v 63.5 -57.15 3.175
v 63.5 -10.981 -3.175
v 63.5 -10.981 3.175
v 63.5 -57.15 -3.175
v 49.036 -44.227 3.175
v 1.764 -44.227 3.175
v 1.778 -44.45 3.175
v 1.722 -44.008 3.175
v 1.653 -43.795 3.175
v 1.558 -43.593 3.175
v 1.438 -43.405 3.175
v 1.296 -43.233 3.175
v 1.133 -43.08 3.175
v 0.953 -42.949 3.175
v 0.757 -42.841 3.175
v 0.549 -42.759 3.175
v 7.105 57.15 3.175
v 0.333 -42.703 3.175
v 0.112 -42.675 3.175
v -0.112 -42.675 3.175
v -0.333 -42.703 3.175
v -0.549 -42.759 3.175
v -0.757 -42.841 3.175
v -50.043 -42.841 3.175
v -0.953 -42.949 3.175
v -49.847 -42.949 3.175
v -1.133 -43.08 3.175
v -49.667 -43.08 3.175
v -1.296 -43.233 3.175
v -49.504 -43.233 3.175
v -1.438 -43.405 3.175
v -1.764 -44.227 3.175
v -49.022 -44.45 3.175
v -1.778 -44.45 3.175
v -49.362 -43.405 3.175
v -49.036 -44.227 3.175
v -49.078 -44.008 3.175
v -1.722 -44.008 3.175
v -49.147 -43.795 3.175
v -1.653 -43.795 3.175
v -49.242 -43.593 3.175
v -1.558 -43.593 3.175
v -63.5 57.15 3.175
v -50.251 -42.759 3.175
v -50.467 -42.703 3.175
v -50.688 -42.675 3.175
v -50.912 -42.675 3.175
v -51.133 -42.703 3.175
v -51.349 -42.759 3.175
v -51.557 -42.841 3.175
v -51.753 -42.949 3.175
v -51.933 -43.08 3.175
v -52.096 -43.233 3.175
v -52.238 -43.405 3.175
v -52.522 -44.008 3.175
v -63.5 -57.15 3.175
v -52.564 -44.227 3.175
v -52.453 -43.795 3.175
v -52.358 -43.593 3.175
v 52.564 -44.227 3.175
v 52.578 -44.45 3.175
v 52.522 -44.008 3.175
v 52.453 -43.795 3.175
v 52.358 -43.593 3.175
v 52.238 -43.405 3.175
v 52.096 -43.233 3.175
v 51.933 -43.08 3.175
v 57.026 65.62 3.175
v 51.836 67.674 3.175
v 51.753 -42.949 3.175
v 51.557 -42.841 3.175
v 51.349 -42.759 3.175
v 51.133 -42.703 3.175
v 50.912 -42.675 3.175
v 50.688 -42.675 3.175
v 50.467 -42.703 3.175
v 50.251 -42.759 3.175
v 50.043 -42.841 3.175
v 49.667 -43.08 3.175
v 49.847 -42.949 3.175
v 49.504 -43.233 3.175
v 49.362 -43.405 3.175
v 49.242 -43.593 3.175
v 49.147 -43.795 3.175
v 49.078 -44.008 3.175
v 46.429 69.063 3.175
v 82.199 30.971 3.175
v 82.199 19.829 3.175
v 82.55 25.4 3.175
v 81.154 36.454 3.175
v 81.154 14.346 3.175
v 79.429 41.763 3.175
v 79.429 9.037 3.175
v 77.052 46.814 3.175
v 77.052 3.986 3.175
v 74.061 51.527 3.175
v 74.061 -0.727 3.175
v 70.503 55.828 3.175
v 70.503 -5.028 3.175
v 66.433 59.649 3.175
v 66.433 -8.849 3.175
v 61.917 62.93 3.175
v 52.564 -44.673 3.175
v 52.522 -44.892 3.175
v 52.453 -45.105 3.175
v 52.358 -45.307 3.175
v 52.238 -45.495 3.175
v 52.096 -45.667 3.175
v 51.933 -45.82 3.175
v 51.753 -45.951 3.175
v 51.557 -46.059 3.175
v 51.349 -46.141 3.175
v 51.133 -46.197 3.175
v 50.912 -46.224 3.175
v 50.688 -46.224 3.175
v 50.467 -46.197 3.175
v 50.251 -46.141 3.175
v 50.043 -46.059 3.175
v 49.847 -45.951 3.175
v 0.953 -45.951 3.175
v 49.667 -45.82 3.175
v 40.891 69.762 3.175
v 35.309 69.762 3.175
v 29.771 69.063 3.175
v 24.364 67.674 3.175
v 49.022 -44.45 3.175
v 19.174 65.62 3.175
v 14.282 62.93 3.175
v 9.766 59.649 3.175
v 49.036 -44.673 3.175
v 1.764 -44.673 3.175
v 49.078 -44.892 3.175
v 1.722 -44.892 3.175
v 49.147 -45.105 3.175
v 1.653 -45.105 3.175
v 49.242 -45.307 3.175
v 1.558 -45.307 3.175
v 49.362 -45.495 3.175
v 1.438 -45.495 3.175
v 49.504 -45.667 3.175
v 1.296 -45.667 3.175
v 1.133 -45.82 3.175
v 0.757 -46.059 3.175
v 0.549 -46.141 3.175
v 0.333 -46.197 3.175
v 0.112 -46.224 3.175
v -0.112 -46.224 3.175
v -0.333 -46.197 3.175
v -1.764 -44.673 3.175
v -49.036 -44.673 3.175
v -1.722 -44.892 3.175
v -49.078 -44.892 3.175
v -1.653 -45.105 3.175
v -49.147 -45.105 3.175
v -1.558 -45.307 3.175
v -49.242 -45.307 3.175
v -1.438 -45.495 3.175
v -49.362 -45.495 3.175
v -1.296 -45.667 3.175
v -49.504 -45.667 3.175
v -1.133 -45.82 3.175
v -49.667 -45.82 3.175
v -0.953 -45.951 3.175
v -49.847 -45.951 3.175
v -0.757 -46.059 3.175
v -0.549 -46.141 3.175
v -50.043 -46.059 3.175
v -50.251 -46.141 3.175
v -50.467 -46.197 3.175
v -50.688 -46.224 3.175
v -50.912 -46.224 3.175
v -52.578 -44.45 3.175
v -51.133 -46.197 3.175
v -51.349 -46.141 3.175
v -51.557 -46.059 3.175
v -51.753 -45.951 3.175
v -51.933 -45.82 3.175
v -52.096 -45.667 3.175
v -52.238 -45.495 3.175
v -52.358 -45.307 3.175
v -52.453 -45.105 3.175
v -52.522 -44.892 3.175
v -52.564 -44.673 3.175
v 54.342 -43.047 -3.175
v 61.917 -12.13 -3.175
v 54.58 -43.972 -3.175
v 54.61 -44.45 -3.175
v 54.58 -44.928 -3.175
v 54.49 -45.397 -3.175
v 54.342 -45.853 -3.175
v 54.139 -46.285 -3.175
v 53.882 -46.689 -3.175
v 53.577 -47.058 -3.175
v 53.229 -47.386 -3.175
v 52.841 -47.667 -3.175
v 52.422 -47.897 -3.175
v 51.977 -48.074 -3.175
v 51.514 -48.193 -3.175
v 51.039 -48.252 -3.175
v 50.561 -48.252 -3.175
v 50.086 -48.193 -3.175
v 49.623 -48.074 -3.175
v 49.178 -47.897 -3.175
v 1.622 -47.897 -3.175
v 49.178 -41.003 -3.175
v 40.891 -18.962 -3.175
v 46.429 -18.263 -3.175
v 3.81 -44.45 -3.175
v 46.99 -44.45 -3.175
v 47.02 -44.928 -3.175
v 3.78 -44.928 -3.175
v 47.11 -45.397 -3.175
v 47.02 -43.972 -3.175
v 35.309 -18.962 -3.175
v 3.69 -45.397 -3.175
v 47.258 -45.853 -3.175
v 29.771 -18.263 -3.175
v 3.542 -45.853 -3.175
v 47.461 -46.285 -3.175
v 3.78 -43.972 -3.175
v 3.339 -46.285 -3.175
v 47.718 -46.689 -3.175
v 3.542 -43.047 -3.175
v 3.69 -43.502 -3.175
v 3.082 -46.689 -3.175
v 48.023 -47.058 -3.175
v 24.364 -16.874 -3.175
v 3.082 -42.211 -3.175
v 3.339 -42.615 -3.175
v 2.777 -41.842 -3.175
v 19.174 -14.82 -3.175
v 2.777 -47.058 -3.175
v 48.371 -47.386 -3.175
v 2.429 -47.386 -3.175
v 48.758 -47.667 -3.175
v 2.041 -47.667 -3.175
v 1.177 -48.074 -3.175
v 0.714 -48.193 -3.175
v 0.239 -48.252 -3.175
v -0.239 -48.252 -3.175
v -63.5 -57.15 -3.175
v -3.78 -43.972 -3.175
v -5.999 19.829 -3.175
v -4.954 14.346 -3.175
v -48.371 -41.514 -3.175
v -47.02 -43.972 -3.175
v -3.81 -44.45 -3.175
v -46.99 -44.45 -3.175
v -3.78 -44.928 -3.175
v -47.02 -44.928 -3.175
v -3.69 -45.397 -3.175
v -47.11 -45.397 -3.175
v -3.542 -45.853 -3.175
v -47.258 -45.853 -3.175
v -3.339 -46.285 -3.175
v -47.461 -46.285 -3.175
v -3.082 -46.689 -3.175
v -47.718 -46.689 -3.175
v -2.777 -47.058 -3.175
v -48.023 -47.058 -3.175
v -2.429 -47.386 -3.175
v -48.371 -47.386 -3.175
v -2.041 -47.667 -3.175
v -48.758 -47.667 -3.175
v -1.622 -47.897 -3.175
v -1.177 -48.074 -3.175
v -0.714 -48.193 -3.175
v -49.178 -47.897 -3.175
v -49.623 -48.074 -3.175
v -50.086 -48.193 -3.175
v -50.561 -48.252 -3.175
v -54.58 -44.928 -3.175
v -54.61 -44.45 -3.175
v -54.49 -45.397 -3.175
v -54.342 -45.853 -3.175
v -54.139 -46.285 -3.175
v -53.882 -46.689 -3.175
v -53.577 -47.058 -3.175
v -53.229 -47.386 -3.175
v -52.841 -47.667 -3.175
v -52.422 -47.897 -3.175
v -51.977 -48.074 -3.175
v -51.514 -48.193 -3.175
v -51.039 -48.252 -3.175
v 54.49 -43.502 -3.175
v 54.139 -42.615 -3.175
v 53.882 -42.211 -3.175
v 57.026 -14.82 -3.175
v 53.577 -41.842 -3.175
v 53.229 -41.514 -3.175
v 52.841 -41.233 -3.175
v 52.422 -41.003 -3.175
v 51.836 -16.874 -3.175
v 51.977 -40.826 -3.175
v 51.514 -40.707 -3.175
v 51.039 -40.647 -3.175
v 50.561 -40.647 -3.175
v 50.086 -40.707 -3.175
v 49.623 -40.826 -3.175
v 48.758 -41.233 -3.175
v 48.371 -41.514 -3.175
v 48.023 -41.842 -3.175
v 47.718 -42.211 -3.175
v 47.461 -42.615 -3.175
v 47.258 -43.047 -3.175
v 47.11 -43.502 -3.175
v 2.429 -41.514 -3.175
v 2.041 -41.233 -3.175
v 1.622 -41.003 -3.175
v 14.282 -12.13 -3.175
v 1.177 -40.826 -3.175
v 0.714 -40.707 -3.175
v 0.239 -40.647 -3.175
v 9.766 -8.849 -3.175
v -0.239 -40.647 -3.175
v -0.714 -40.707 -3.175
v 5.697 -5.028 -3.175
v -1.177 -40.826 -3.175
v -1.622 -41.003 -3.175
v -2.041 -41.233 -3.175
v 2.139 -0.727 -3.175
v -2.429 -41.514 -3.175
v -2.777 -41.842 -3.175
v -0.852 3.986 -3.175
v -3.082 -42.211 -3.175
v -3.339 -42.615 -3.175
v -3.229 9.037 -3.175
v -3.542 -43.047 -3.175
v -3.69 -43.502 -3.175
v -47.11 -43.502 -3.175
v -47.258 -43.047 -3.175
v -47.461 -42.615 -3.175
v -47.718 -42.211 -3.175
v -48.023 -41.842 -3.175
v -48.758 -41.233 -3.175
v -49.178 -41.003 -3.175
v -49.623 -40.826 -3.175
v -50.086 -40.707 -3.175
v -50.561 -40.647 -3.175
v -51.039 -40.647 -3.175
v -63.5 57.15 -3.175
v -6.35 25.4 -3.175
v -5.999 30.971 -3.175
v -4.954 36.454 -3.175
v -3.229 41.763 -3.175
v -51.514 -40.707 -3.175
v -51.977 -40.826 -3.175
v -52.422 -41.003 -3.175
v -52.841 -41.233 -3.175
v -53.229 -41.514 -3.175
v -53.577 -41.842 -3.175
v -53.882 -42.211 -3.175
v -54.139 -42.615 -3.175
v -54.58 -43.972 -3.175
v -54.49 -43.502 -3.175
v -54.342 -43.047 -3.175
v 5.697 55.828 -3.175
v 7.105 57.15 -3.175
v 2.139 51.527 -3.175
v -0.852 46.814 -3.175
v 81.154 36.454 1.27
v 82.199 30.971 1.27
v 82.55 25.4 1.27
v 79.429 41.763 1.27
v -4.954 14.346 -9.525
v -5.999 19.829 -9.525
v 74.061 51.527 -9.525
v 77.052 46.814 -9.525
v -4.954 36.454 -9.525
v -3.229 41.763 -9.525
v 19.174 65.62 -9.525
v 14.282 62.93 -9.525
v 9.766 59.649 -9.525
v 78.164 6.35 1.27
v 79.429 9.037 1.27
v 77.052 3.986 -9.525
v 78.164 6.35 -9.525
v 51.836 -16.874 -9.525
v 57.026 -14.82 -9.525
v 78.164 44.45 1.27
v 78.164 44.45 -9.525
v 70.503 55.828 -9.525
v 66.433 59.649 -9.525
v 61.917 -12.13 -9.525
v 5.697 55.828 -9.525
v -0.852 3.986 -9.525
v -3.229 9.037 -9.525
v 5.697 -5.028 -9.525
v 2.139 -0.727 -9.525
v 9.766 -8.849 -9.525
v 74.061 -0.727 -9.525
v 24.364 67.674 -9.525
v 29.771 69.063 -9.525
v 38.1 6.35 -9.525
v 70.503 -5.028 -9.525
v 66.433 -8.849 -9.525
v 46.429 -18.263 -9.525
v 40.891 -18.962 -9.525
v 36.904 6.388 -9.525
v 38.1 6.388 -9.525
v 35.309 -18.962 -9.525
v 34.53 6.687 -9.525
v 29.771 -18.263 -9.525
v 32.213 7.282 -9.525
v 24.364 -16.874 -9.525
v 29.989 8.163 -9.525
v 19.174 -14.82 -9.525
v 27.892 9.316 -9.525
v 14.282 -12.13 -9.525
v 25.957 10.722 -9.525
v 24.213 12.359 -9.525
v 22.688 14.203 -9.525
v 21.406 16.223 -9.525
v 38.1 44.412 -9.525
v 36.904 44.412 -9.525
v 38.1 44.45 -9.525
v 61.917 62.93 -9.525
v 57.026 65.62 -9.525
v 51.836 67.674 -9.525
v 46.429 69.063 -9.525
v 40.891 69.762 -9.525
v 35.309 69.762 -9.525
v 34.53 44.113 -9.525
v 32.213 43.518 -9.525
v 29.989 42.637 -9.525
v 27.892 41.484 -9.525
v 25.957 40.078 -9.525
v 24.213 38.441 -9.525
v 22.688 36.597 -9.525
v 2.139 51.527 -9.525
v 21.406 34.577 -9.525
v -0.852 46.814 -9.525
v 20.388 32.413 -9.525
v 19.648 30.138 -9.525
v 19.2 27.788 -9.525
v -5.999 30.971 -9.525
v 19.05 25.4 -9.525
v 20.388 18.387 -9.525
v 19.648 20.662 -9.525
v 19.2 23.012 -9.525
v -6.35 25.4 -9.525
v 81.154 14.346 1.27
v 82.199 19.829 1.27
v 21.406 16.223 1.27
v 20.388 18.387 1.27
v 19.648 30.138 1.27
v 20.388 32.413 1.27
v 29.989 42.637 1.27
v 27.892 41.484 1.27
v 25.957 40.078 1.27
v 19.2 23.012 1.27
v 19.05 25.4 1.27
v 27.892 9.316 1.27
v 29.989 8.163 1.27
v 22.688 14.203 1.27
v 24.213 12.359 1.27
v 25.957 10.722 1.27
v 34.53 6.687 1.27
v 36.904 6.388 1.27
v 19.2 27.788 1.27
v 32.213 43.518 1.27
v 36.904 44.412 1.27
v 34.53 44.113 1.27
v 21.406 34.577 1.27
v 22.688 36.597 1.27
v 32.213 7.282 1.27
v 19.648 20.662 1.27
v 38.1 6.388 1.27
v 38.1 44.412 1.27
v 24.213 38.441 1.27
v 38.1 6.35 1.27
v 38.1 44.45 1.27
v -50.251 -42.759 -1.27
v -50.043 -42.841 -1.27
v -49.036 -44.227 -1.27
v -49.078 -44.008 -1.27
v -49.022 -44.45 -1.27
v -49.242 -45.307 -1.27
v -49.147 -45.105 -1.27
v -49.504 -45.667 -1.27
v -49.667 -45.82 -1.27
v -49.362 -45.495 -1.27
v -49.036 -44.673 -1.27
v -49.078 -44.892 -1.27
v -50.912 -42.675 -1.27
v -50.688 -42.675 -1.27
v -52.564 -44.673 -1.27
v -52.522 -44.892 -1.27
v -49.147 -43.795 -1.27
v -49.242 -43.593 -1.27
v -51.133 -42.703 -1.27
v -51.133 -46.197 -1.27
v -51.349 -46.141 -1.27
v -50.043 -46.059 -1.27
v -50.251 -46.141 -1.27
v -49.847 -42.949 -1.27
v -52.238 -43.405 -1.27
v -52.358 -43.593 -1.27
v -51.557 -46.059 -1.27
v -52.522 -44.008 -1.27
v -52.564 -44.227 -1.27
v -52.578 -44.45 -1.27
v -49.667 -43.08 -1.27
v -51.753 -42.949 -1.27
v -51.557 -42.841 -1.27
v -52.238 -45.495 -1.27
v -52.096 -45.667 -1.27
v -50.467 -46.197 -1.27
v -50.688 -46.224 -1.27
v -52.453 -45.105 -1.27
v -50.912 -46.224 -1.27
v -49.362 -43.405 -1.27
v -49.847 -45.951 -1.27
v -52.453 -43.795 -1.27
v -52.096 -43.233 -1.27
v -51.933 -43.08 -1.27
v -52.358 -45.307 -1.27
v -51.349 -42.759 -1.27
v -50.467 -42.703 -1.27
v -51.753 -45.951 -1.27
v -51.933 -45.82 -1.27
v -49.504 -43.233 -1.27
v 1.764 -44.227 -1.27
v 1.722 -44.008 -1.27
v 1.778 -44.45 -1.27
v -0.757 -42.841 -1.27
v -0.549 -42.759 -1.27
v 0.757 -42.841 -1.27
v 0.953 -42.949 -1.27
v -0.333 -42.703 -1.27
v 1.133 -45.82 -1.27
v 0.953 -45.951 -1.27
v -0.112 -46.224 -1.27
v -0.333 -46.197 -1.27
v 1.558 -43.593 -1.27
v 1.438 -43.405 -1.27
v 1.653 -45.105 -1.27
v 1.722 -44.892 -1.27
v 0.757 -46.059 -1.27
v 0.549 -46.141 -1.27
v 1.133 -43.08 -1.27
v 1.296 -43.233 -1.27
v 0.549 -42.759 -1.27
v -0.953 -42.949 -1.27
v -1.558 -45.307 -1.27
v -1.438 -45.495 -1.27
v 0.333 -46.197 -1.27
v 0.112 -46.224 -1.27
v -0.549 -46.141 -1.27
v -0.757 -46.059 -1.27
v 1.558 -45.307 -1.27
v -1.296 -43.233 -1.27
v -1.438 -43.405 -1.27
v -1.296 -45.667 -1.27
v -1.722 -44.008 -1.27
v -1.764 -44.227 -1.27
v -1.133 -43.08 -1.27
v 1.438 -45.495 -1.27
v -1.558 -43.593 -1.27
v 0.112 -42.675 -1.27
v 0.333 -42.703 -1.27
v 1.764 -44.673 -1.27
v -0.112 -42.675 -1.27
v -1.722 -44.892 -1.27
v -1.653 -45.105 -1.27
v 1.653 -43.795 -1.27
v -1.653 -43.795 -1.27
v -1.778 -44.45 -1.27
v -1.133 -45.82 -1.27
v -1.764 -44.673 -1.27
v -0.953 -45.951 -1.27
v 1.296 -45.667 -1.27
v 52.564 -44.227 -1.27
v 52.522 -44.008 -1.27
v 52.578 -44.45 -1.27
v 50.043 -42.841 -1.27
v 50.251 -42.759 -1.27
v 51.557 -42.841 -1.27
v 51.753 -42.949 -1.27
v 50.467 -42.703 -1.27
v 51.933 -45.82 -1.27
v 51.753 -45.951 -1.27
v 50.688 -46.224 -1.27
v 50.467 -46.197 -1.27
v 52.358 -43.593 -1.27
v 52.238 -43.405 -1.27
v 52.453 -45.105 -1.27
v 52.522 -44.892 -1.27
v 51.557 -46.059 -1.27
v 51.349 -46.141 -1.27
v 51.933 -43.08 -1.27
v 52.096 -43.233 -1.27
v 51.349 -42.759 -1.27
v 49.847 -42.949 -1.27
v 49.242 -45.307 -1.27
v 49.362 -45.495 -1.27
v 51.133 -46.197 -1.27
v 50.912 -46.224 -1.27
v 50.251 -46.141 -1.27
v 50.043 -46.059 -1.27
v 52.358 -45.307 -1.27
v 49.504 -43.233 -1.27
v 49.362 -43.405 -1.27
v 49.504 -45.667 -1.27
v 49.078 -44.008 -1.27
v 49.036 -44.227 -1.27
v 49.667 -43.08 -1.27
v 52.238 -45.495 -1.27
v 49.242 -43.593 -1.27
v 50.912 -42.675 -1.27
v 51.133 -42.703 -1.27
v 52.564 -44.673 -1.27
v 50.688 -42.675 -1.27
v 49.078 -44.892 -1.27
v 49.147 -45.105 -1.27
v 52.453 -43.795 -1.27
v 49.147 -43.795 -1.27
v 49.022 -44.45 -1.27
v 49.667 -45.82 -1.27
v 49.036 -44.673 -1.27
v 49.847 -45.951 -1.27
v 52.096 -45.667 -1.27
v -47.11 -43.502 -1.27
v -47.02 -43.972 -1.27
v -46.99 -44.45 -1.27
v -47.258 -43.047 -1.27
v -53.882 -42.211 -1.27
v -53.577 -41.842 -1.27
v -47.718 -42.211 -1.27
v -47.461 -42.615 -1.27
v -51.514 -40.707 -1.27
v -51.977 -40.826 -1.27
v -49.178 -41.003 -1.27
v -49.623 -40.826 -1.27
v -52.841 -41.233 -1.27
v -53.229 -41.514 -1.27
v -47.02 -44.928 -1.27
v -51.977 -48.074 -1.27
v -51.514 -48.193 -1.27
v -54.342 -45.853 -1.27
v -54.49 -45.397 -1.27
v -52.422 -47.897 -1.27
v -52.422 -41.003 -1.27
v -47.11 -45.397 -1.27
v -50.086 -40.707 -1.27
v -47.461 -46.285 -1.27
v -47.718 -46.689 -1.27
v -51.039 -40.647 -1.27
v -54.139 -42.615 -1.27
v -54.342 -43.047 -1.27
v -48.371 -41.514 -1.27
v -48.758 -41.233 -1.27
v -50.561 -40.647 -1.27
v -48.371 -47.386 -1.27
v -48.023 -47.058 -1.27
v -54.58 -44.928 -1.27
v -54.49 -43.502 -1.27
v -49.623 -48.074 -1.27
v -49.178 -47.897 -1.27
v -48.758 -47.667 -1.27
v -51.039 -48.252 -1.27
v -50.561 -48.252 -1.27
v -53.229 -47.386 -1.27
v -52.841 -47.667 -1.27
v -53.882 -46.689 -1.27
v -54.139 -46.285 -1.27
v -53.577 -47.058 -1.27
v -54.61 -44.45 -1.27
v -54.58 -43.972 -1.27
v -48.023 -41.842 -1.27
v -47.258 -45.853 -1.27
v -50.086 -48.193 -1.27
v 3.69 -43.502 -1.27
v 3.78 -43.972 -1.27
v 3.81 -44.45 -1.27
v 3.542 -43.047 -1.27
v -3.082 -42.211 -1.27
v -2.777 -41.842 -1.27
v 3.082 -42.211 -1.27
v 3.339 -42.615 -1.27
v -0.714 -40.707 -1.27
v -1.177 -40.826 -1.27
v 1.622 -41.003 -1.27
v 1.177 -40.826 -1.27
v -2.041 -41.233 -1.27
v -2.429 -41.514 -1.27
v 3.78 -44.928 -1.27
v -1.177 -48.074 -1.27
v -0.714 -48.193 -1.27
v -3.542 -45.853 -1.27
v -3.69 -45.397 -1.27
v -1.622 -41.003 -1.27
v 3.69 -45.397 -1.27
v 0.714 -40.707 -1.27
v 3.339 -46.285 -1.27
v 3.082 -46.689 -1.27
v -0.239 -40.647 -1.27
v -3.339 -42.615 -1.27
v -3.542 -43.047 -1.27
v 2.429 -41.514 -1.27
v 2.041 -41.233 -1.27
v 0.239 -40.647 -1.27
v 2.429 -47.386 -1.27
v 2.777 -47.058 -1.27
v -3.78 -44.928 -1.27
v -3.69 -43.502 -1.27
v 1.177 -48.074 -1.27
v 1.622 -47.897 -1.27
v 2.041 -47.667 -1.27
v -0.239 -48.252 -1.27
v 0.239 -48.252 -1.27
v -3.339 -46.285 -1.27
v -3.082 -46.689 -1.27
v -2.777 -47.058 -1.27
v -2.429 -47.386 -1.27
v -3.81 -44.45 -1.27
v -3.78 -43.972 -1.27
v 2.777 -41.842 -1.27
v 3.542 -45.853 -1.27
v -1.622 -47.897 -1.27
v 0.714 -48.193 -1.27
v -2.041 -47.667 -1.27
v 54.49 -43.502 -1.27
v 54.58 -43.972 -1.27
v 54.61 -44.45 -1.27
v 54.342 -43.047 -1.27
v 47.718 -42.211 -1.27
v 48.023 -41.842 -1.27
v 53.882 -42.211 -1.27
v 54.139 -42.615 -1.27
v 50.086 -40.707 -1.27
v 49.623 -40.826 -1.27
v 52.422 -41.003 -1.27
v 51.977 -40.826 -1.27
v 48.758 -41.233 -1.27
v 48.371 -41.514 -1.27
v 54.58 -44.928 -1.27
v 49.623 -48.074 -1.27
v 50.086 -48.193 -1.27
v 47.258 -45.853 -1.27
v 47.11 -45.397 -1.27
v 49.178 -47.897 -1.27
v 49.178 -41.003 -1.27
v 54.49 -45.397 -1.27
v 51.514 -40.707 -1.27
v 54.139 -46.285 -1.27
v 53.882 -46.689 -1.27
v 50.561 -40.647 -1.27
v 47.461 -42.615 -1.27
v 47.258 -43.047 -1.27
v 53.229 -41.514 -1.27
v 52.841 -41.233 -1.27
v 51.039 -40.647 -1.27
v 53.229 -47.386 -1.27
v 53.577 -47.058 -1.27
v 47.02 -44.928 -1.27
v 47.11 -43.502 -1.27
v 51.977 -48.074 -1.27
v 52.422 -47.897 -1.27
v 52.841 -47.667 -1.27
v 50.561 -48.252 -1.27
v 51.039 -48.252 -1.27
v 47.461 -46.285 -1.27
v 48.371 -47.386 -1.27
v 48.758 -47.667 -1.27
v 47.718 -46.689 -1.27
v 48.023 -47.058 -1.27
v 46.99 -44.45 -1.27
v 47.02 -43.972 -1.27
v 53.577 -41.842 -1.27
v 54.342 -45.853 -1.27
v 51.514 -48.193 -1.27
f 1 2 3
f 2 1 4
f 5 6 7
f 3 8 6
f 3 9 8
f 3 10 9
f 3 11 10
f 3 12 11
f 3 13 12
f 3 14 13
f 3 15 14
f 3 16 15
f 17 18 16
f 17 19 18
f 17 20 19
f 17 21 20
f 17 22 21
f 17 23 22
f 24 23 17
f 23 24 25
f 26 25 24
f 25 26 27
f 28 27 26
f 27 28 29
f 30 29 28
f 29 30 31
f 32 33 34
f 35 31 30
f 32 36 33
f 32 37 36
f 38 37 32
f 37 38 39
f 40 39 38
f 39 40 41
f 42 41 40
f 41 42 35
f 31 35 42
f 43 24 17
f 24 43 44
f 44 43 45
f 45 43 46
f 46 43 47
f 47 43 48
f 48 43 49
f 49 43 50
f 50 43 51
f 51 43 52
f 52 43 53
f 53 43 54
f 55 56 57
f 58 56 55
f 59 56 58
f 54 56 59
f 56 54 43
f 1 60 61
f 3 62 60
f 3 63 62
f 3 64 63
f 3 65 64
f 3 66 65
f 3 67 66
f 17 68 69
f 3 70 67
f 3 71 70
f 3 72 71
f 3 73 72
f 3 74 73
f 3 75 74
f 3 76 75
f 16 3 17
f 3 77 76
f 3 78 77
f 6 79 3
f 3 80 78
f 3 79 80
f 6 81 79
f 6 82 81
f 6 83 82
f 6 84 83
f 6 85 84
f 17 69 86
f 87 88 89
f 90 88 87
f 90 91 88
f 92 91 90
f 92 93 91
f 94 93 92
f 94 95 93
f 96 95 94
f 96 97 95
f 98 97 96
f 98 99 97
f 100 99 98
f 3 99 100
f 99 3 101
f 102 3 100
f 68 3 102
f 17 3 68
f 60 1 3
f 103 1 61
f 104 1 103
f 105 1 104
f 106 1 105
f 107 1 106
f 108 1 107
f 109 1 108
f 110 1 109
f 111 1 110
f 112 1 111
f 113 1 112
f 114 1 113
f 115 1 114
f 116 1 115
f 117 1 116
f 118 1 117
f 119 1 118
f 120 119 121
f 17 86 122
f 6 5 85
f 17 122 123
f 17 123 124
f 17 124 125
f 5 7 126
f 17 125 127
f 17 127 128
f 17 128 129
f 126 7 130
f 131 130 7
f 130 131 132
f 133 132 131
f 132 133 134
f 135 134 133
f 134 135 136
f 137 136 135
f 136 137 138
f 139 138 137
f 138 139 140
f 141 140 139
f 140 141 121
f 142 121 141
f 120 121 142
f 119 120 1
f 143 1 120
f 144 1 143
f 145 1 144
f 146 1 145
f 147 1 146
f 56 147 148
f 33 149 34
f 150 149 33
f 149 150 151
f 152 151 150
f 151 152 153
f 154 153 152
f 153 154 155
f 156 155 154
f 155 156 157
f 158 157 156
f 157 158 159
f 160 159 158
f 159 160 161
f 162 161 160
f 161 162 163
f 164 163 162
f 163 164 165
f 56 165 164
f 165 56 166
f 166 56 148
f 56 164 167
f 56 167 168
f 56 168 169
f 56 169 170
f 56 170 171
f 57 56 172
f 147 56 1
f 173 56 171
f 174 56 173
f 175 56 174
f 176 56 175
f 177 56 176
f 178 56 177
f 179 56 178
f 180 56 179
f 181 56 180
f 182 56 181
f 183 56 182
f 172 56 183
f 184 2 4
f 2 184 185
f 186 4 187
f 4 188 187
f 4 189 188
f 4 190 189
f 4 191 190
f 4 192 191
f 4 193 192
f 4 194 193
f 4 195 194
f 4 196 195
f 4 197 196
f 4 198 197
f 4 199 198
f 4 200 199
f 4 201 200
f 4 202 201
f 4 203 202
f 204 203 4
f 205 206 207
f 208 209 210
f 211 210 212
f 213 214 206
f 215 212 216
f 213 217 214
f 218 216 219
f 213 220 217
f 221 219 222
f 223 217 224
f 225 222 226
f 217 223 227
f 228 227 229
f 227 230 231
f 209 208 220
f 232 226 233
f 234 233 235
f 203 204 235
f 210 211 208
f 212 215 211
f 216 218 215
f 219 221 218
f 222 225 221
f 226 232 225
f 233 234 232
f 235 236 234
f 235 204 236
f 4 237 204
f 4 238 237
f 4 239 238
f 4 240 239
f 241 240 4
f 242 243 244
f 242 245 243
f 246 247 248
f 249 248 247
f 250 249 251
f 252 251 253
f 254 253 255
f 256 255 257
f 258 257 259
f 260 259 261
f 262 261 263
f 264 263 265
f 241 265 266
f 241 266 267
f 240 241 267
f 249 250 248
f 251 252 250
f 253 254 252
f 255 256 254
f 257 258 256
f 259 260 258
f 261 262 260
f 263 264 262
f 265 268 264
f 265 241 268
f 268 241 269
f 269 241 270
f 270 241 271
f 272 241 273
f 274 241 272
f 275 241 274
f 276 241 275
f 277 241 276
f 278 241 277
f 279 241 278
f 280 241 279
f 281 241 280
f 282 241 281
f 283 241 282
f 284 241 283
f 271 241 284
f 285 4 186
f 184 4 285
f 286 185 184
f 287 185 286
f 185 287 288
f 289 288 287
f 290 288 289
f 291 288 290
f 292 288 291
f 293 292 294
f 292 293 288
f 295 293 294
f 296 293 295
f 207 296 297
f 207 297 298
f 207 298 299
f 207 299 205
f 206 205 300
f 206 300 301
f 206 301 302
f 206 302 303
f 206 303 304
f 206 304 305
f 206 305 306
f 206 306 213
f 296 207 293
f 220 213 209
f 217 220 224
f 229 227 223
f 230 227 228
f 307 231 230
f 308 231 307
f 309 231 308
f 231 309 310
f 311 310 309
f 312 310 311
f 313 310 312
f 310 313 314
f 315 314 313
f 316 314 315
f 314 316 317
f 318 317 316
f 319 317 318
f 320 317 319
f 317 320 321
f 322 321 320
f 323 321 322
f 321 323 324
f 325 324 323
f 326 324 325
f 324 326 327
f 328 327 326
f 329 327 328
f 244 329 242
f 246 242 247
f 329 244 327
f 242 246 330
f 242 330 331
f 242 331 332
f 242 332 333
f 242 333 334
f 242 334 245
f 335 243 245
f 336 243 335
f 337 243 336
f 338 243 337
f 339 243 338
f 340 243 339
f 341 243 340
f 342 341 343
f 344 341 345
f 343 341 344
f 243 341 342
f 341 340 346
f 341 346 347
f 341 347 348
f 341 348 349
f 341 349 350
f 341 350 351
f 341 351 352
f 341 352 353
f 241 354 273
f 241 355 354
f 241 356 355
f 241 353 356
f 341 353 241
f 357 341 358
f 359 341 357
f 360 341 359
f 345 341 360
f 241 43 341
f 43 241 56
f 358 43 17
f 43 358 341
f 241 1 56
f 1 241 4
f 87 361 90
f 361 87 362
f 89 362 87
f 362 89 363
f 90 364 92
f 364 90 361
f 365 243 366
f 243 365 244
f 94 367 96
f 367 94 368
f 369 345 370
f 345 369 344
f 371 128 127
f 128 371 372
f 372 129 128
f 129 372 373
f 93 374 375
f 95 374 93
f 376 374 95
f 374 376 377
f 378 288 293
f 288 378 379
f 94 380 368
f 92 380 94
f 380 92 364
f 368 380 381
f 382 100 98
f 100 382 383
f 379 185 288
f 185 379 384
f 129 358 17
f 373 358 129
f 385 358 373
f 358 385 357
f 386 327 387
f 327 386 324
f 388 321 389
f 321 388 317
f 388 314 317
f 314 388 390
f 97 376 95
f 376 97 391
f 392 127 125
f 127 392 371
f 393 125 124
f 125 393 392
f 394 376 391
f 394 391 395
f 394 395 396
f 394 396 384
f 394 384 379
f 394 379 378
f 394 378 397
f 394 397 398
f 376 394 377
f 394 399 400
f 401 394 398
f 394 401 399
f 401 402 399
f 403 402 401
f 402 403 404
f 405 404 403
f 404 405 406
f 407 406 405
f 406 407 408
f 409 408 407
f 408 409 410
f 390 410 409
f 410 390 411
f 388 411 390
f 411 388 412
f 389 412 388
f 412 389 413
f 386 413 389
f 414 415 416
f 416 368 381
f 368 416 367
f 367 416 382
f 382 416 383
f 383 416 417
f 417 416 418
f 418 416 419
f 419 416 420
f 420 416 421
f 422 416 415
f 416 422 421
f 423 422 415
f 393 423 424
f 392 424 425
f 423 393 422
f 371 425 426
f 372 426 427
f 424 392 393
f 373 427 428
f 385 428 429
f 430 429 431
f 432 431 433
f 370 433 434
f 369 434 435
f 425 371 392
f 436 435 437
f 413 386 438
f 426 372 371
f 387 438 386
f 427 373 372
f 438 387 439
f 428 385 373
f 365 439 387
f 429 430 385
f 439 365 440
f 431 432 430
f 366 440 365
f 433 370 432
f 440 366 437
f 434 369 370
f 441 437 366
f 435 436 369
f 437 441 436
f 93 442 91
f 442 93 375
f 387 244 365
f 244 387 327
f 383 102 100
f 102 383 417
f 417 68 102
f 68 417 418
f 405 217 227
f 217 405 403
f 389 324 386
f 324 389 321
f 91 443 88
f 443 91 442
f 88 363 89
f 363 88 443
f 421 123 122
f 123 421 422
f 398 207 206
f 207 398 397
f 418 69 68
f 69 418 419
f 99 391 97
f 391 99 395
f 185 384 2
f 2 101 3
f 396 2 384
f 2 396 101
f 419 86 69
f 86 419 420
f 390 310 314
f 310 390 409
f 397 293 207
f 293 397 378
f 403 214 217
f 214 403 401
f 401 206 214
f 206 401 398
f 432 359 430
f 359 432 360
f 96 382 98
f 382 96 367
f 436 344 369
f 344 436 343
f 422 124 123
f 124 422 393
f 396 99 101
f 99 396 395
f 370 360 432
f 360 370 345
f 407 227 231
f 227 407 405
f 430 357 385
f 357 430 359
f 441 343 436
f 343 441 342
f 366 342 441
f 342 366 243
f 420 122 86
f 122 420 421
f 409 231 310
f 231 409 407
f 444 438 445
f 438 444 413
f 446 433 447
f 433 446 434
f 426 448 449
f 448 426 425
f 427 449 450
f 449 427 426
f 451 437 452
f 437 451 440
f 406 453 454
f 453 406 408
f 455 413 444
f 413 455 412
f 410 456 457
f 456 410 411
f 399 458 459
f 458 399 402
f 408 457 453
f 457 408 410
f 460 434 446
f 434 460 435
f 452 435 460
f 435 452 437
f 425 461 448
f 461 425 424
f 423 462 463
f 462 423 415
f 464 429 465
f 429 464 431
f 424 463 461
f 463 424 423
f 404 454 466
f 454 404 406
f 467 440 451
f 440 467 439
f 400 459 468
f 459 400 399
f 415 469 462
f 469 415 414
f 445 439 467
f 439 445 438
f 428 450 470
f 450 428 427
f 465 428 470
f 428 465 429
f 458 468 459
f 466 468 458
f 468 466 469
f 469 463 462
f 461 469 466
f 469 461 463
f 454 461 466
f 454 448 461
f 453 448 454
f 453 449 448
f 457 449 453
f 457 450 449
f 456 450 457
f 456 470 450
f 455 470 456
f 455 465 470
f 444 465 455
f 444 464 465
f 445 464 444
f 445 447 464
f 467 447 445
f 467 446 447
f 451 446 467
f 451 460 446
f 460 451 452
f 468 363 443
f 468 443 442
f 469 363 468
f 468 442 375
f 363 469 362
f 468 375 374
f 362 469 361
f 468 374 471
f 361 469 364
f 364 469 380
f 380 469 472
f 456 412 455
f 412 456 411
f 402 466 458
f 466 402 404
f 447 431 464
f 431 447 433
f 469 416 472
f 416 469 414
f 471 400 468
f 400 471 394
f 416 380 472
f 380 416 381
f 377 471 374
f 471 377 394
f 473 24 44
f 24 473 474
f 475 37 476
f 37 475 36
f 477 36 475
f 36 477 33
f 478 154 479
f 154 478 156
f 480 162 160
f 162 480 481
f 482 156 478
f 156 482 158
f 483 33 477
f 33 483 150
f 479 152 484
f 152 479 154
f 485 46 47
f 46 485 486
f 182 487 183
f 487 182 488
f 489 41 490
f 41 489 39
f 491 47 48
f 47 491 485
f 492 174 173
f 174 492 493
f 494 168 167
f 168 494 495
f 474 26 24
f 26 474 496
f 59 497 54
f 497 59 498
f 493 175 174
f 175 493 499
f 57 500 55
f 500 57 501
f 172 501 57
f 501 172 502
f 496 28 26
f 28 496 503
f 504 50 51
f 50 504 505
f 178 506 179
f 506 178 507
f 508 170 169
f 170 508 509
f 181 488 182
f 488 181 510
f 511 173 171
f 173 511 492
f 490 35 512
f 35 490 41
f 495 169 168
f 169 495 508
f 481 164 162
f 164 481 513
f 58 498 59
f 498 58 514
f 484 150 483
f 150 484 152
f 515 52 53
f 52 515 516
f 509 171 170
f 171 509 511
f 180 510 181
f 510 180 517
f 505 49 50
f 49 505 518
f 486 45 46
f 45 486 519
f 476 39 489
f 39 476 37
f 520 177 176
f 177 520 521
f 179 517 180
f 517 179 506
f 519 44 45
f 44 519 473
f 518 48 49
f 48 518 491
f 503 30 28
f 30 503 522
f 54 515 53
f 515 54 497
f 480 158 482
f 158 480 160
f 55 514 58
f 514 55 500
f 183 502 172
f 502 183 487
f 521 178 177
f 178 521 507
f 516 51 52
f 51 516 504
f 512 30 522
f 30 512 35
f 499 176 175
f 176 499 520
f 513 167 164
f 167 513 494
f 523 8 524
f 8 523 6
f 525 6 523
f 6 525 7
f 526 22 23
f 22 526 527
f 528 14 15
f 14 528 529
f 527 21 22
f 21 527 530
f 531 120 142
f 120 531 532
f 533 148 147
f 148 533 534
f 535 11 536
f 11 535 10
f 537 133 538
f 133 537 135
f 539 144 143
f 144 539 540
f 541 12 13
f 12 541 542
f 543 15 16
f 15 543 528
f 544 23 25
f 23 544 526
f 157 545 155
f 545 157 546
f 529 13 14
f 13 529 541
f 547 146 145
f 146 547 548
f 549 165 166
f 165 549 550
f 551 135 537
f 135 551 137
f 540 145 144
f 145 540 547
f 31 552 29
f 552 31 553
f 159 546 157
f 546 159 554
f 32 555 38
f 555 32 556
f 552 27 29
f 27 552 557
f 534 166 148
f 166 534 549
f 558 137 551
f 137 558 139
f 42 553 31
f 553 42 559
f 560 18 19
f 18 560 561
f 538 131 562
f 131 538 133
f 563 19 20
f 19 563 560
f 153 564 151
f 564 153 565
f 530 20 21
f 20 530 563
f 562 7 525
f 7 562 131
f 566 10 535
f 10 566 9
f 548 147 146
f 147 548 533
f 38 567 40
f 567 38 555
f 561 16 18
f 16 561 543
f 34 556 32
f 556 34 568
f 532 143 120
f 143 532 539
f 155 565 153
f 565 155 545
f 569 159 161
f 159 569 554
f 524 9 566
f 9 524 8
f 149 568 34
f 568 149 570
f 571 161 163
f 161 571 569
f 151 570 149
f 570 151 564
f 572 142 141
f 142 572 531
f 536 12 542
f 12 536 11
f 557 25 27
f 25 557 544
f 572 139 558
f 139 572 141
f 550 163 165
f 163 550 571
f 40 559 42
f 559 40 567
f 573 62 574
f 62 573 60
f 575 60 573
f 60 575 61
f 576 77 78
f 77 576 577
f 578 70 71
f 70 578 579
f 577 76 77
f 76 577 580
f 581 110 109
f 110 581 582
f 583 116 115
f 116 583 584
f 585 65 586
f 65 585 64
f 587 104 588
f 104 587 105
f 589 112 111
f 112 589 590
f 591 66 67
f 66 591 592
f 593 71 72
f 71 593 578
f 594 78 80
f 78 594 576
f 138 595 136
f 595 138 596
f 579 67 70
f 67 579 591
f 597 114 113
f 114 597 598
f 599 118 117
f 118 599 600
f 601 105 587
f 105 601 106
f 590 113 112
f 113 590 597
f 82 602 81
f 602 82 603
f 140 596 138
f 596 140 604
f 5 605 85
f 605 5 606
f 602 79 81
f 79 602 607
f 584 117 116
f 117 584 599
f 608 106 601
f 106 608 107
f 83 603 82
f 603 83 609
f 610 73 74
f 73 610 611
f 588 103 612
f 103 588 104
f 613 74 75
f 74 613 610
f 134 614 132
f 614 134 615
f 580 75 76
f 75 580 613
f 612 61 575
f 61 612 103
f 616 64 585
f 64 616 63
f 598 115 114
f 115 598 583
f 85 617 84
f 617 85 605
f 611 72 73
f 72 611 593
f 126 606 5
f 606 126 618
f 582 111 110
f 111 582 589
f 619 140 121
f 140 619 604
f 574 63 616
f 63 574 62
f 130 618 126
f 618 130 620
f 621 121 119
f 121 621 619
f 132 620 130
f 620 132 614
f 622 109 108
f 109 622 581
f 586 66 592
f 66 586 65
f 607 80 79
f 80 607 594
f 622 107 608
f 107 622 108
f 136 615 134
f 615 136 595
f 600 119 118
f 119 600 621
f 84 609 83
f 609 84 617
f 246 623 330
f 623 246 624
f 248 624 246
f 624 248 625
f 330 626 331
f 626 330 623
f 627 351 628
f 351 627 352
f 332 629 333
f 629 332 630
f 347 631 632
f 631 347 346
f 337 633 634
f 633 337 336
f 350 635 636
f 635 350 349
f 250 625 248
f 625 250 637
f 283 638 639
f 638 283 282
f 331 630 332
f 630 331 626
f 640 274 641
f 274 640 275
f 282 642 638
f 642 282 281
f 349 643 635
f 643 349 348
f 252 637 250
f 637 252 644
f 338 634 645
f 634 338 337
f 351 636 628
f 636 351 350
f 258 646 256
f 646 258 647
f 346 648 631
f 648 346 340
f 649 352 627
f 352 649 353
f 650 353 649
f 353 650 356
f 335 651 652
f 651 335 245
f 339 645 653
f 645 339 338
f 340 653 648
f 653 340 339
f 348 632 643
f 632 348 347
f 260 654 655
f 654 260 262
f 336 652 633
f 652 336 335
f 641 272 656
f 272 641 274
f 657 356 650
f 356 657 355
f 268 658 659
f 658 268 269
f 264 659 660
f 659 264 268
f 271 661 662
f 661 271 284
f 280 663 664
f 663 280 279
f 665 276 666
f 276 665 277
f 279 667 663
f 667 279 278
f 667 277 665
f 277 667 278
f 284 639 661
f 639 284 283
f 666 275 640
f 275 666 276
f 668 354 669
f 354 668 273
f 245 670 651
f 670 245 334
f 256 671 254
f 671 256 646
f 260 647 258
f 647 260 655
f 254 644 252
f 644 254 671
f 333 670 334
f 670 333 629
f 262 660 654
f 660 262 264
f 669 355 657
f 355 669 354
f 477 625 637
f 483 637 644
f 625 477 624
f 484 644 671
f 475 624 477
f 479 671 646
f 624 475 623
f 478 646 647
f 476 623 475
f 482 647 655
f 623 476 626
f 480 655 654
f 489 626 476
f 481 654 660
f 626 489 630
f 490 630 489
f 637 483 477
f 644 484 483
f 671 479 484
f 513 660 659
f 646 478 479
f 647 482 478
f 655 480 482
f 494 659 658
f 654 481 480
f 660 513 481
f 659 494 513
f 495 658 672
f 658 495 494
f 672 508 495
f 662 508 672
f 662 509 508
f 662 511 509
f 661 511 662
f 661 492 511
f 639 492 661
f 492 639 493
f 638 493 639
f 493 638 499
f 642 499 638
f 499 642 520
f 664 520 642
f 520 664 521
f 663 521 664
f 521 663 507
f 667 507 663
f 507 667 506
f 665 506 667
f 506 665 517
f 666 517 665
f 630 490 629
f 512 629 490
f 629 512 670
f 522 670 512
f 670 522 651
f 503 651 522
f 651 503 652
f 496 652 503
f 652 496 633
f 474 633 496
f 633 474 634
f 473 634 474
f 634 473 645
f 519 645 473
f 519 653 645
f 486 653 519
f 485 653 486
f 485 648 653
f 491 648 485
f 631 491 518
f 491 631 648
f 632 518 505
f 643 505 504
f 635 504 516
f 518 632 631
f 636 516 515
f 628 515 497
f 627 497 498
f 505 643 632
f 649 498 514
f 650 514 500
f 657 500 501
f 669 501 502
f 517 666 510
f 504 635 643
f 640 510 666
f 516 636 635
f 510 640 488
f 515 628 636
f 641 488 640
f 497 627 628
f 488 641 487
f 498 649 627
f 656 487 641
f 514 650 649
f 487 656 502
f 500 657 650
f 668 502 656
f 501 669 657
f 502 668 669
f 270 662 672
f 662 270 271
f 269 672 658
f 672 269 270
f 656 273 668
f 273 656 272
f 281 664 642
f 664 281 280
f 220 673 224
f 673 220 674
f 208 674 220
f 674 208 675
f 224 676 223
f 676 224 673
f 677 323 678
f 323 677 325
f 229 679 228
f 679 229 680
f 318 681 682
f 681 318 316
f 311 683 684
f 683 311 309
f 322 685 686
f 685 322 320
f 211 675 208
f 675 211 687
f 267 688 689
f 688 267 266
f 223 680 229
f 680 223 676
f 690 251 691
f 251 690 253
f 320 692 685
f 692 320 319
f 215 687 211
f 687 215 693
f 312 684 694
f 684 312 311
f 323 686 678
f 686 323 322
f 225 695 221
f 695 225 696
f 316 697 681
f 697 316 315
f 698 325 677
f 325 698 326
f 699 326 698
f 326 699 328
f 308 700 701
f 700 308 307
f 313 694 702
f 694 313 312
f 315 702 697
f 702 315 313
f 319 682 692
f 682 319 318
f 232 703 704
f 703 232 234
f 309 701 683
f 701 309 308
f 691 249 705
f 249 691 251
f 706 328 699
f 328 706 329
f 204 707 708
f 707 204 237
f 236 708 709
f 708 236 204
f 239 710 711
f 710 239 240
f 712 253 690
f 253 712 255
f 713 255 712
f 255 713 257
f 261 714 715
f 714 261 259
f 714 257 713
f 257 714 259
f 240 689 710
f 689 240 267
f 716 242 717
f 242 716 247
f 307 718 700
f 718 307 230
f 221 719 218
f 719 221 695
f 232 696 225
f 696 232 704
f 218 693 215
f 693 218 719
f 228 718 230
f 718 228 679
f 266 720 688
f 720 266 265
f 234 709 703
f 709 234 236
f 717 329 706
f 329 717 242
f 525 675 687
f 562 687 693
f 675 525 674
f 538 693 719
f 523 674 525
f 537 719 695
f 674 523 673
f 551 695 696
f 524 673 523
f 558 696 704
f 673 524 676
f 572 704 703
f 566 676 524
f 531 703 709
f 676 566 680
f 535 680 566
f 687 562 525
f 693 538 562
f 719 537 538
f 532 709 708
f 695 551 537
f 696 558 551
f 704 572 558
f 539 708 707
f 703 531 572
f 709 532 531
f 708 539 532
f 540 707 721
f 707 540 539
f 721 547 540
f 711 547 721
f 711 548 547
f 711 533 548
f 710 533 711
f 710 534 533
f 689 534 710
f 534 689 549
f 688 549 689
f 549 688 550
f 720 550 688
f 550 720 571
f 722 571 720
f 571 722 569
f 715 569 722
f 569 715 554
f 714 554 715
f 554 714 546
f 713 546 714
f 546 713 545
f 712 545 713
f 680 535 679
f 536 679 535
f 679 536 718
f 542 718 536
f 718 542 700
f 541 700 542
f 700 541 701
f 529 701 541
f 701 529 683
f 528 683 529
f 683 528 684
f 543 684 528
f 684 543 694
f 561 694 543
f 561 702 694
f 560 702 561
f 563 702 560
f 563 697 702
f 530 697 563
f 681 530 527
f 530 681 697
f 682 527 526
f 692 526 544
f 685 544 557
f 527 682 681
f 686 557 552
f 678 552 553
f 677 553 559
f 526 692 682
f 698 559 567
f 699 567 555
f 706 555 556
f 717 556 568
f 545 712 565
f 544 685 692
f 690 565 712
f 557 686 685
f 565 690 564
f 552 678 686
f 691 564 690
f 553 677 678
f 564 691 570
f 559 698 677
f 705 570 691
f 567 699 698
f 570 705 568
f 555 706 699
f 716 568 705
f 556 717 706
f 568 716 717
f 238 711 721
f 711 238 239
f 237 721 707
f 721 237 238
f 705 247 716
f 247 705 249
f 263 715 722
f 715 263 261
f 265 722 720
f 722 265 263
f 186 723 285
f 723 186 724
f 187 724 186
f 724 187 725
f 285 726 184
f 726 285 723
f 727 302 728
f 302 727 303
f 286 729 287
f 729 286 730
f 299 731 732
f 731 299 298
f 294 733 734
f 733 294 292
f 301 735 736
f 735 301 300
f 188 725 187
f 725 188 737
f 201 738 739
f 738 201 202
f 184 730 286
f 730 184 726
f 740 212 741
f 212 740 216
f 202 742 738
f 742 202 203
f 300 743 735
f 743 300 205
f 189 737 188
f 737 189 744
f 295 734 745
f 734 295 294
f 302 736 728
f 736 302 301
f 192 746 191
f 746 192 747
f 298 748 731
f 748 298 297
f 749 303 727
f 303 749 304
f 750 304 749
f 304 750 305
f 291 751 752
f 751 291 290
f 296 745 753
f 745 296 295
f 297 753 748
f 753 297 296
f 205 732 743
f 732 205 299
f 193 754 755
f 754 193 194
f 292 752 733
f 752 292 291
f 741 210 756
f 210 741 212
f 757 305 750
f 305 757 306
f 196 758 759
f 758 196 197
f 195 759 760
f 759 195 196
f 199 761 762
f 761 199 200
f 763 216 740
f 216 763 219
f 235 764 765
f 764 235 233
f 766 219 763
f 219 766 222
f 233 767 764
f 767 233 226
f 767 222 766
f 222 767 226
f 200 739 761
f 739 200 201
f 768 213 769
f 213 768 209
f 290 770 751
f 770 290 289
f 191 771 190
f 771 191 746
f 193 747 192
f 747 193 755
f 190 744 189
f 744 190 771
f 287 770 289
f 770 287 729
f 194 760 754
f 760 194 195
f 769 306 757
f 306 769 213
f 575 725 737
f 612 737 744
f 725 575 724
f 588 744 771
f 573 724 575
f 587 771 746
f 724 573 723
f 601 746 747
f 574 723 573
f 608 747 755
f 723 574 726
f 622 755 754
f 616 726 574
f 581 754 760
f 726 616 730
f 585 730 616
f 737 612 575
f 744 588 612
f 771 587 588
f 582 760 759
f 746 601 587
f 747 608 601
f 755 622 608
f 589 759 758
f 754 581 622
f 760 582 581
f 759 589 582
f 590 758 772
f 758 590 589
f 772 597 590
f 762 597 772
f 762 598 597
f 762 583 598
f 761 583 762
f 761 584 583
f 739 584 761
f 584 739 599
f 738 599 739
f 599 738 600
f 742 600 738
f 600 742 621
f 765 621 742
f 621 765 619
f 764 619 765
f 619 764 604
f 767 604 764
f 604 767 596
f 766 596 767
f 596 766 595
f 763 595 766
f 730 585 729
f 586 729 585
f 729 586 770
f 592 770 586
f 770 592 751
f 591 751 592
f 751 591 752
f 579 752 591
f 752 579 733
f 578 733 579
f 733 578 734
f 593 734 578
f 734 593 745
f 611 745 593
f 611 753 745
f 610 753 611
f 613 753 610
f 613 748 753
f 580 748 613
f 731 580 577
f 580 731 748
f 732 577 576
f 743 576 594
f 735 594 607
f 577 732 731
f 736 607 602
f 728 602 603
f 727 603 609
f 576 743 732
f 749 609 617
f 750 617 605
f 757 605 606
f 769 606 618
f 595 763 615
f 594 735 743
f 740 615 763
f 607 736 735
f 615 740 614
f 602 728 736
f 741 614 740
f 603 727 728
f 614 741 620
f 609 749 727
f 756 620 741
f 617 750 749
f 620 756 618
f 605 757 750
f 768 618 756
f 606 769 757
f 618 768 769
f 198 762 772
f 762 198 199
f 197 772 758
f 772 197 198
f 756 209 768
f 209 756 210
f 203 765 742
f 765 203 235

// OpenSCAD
height = 5;
width = 4.5;
//output STL in inches:
scale(25.4, 25.4, 25.4)
difference(){
    difference() {
        union(){
            difference(){
                //Main plate:
                cube([height,width,0.25], center=true);
                //Subtract the corner:
                translate([2,2,0])
                    cube([1,1,2], center=true);
                
            }
            translate([1.5,1,-0.125])
                cylinder(0.5, r = 1.75, center = true, $fn=50);
        }
        //center hole
        translate([1.5,1, -0.95])
        cylinder(2, r = 0.75, center = true, $fn=50);
        
        //top notch to allow axle to slide in from top
        translate([4,1,-0.2])
        cube([5,1.5,0.5], center=true);
        
    }
    translate([-2,-1.75,1])
        cylinder(3, r=0.07, center = true, $fn=50);
     translate([-0,-1.75,1])
        cylinder(3, r=0.07, center = true, $fn=50);
      translate([2,-1.75,1])
        cylinder(3, r=0.07, center = true, $fn=50);
      translate([-2,-1.75,-0.1])
        cylinder(.1, r=0.15, center = true, $fn=50);
      translate([-0,-1.75,-0.1])
        cylinder(.1, r=0.15, center = true, $fn=50);
      translate([2,-1.75,-0.1])
        cylinder(.1, r=0.15, center = true, $fn=50);
}
